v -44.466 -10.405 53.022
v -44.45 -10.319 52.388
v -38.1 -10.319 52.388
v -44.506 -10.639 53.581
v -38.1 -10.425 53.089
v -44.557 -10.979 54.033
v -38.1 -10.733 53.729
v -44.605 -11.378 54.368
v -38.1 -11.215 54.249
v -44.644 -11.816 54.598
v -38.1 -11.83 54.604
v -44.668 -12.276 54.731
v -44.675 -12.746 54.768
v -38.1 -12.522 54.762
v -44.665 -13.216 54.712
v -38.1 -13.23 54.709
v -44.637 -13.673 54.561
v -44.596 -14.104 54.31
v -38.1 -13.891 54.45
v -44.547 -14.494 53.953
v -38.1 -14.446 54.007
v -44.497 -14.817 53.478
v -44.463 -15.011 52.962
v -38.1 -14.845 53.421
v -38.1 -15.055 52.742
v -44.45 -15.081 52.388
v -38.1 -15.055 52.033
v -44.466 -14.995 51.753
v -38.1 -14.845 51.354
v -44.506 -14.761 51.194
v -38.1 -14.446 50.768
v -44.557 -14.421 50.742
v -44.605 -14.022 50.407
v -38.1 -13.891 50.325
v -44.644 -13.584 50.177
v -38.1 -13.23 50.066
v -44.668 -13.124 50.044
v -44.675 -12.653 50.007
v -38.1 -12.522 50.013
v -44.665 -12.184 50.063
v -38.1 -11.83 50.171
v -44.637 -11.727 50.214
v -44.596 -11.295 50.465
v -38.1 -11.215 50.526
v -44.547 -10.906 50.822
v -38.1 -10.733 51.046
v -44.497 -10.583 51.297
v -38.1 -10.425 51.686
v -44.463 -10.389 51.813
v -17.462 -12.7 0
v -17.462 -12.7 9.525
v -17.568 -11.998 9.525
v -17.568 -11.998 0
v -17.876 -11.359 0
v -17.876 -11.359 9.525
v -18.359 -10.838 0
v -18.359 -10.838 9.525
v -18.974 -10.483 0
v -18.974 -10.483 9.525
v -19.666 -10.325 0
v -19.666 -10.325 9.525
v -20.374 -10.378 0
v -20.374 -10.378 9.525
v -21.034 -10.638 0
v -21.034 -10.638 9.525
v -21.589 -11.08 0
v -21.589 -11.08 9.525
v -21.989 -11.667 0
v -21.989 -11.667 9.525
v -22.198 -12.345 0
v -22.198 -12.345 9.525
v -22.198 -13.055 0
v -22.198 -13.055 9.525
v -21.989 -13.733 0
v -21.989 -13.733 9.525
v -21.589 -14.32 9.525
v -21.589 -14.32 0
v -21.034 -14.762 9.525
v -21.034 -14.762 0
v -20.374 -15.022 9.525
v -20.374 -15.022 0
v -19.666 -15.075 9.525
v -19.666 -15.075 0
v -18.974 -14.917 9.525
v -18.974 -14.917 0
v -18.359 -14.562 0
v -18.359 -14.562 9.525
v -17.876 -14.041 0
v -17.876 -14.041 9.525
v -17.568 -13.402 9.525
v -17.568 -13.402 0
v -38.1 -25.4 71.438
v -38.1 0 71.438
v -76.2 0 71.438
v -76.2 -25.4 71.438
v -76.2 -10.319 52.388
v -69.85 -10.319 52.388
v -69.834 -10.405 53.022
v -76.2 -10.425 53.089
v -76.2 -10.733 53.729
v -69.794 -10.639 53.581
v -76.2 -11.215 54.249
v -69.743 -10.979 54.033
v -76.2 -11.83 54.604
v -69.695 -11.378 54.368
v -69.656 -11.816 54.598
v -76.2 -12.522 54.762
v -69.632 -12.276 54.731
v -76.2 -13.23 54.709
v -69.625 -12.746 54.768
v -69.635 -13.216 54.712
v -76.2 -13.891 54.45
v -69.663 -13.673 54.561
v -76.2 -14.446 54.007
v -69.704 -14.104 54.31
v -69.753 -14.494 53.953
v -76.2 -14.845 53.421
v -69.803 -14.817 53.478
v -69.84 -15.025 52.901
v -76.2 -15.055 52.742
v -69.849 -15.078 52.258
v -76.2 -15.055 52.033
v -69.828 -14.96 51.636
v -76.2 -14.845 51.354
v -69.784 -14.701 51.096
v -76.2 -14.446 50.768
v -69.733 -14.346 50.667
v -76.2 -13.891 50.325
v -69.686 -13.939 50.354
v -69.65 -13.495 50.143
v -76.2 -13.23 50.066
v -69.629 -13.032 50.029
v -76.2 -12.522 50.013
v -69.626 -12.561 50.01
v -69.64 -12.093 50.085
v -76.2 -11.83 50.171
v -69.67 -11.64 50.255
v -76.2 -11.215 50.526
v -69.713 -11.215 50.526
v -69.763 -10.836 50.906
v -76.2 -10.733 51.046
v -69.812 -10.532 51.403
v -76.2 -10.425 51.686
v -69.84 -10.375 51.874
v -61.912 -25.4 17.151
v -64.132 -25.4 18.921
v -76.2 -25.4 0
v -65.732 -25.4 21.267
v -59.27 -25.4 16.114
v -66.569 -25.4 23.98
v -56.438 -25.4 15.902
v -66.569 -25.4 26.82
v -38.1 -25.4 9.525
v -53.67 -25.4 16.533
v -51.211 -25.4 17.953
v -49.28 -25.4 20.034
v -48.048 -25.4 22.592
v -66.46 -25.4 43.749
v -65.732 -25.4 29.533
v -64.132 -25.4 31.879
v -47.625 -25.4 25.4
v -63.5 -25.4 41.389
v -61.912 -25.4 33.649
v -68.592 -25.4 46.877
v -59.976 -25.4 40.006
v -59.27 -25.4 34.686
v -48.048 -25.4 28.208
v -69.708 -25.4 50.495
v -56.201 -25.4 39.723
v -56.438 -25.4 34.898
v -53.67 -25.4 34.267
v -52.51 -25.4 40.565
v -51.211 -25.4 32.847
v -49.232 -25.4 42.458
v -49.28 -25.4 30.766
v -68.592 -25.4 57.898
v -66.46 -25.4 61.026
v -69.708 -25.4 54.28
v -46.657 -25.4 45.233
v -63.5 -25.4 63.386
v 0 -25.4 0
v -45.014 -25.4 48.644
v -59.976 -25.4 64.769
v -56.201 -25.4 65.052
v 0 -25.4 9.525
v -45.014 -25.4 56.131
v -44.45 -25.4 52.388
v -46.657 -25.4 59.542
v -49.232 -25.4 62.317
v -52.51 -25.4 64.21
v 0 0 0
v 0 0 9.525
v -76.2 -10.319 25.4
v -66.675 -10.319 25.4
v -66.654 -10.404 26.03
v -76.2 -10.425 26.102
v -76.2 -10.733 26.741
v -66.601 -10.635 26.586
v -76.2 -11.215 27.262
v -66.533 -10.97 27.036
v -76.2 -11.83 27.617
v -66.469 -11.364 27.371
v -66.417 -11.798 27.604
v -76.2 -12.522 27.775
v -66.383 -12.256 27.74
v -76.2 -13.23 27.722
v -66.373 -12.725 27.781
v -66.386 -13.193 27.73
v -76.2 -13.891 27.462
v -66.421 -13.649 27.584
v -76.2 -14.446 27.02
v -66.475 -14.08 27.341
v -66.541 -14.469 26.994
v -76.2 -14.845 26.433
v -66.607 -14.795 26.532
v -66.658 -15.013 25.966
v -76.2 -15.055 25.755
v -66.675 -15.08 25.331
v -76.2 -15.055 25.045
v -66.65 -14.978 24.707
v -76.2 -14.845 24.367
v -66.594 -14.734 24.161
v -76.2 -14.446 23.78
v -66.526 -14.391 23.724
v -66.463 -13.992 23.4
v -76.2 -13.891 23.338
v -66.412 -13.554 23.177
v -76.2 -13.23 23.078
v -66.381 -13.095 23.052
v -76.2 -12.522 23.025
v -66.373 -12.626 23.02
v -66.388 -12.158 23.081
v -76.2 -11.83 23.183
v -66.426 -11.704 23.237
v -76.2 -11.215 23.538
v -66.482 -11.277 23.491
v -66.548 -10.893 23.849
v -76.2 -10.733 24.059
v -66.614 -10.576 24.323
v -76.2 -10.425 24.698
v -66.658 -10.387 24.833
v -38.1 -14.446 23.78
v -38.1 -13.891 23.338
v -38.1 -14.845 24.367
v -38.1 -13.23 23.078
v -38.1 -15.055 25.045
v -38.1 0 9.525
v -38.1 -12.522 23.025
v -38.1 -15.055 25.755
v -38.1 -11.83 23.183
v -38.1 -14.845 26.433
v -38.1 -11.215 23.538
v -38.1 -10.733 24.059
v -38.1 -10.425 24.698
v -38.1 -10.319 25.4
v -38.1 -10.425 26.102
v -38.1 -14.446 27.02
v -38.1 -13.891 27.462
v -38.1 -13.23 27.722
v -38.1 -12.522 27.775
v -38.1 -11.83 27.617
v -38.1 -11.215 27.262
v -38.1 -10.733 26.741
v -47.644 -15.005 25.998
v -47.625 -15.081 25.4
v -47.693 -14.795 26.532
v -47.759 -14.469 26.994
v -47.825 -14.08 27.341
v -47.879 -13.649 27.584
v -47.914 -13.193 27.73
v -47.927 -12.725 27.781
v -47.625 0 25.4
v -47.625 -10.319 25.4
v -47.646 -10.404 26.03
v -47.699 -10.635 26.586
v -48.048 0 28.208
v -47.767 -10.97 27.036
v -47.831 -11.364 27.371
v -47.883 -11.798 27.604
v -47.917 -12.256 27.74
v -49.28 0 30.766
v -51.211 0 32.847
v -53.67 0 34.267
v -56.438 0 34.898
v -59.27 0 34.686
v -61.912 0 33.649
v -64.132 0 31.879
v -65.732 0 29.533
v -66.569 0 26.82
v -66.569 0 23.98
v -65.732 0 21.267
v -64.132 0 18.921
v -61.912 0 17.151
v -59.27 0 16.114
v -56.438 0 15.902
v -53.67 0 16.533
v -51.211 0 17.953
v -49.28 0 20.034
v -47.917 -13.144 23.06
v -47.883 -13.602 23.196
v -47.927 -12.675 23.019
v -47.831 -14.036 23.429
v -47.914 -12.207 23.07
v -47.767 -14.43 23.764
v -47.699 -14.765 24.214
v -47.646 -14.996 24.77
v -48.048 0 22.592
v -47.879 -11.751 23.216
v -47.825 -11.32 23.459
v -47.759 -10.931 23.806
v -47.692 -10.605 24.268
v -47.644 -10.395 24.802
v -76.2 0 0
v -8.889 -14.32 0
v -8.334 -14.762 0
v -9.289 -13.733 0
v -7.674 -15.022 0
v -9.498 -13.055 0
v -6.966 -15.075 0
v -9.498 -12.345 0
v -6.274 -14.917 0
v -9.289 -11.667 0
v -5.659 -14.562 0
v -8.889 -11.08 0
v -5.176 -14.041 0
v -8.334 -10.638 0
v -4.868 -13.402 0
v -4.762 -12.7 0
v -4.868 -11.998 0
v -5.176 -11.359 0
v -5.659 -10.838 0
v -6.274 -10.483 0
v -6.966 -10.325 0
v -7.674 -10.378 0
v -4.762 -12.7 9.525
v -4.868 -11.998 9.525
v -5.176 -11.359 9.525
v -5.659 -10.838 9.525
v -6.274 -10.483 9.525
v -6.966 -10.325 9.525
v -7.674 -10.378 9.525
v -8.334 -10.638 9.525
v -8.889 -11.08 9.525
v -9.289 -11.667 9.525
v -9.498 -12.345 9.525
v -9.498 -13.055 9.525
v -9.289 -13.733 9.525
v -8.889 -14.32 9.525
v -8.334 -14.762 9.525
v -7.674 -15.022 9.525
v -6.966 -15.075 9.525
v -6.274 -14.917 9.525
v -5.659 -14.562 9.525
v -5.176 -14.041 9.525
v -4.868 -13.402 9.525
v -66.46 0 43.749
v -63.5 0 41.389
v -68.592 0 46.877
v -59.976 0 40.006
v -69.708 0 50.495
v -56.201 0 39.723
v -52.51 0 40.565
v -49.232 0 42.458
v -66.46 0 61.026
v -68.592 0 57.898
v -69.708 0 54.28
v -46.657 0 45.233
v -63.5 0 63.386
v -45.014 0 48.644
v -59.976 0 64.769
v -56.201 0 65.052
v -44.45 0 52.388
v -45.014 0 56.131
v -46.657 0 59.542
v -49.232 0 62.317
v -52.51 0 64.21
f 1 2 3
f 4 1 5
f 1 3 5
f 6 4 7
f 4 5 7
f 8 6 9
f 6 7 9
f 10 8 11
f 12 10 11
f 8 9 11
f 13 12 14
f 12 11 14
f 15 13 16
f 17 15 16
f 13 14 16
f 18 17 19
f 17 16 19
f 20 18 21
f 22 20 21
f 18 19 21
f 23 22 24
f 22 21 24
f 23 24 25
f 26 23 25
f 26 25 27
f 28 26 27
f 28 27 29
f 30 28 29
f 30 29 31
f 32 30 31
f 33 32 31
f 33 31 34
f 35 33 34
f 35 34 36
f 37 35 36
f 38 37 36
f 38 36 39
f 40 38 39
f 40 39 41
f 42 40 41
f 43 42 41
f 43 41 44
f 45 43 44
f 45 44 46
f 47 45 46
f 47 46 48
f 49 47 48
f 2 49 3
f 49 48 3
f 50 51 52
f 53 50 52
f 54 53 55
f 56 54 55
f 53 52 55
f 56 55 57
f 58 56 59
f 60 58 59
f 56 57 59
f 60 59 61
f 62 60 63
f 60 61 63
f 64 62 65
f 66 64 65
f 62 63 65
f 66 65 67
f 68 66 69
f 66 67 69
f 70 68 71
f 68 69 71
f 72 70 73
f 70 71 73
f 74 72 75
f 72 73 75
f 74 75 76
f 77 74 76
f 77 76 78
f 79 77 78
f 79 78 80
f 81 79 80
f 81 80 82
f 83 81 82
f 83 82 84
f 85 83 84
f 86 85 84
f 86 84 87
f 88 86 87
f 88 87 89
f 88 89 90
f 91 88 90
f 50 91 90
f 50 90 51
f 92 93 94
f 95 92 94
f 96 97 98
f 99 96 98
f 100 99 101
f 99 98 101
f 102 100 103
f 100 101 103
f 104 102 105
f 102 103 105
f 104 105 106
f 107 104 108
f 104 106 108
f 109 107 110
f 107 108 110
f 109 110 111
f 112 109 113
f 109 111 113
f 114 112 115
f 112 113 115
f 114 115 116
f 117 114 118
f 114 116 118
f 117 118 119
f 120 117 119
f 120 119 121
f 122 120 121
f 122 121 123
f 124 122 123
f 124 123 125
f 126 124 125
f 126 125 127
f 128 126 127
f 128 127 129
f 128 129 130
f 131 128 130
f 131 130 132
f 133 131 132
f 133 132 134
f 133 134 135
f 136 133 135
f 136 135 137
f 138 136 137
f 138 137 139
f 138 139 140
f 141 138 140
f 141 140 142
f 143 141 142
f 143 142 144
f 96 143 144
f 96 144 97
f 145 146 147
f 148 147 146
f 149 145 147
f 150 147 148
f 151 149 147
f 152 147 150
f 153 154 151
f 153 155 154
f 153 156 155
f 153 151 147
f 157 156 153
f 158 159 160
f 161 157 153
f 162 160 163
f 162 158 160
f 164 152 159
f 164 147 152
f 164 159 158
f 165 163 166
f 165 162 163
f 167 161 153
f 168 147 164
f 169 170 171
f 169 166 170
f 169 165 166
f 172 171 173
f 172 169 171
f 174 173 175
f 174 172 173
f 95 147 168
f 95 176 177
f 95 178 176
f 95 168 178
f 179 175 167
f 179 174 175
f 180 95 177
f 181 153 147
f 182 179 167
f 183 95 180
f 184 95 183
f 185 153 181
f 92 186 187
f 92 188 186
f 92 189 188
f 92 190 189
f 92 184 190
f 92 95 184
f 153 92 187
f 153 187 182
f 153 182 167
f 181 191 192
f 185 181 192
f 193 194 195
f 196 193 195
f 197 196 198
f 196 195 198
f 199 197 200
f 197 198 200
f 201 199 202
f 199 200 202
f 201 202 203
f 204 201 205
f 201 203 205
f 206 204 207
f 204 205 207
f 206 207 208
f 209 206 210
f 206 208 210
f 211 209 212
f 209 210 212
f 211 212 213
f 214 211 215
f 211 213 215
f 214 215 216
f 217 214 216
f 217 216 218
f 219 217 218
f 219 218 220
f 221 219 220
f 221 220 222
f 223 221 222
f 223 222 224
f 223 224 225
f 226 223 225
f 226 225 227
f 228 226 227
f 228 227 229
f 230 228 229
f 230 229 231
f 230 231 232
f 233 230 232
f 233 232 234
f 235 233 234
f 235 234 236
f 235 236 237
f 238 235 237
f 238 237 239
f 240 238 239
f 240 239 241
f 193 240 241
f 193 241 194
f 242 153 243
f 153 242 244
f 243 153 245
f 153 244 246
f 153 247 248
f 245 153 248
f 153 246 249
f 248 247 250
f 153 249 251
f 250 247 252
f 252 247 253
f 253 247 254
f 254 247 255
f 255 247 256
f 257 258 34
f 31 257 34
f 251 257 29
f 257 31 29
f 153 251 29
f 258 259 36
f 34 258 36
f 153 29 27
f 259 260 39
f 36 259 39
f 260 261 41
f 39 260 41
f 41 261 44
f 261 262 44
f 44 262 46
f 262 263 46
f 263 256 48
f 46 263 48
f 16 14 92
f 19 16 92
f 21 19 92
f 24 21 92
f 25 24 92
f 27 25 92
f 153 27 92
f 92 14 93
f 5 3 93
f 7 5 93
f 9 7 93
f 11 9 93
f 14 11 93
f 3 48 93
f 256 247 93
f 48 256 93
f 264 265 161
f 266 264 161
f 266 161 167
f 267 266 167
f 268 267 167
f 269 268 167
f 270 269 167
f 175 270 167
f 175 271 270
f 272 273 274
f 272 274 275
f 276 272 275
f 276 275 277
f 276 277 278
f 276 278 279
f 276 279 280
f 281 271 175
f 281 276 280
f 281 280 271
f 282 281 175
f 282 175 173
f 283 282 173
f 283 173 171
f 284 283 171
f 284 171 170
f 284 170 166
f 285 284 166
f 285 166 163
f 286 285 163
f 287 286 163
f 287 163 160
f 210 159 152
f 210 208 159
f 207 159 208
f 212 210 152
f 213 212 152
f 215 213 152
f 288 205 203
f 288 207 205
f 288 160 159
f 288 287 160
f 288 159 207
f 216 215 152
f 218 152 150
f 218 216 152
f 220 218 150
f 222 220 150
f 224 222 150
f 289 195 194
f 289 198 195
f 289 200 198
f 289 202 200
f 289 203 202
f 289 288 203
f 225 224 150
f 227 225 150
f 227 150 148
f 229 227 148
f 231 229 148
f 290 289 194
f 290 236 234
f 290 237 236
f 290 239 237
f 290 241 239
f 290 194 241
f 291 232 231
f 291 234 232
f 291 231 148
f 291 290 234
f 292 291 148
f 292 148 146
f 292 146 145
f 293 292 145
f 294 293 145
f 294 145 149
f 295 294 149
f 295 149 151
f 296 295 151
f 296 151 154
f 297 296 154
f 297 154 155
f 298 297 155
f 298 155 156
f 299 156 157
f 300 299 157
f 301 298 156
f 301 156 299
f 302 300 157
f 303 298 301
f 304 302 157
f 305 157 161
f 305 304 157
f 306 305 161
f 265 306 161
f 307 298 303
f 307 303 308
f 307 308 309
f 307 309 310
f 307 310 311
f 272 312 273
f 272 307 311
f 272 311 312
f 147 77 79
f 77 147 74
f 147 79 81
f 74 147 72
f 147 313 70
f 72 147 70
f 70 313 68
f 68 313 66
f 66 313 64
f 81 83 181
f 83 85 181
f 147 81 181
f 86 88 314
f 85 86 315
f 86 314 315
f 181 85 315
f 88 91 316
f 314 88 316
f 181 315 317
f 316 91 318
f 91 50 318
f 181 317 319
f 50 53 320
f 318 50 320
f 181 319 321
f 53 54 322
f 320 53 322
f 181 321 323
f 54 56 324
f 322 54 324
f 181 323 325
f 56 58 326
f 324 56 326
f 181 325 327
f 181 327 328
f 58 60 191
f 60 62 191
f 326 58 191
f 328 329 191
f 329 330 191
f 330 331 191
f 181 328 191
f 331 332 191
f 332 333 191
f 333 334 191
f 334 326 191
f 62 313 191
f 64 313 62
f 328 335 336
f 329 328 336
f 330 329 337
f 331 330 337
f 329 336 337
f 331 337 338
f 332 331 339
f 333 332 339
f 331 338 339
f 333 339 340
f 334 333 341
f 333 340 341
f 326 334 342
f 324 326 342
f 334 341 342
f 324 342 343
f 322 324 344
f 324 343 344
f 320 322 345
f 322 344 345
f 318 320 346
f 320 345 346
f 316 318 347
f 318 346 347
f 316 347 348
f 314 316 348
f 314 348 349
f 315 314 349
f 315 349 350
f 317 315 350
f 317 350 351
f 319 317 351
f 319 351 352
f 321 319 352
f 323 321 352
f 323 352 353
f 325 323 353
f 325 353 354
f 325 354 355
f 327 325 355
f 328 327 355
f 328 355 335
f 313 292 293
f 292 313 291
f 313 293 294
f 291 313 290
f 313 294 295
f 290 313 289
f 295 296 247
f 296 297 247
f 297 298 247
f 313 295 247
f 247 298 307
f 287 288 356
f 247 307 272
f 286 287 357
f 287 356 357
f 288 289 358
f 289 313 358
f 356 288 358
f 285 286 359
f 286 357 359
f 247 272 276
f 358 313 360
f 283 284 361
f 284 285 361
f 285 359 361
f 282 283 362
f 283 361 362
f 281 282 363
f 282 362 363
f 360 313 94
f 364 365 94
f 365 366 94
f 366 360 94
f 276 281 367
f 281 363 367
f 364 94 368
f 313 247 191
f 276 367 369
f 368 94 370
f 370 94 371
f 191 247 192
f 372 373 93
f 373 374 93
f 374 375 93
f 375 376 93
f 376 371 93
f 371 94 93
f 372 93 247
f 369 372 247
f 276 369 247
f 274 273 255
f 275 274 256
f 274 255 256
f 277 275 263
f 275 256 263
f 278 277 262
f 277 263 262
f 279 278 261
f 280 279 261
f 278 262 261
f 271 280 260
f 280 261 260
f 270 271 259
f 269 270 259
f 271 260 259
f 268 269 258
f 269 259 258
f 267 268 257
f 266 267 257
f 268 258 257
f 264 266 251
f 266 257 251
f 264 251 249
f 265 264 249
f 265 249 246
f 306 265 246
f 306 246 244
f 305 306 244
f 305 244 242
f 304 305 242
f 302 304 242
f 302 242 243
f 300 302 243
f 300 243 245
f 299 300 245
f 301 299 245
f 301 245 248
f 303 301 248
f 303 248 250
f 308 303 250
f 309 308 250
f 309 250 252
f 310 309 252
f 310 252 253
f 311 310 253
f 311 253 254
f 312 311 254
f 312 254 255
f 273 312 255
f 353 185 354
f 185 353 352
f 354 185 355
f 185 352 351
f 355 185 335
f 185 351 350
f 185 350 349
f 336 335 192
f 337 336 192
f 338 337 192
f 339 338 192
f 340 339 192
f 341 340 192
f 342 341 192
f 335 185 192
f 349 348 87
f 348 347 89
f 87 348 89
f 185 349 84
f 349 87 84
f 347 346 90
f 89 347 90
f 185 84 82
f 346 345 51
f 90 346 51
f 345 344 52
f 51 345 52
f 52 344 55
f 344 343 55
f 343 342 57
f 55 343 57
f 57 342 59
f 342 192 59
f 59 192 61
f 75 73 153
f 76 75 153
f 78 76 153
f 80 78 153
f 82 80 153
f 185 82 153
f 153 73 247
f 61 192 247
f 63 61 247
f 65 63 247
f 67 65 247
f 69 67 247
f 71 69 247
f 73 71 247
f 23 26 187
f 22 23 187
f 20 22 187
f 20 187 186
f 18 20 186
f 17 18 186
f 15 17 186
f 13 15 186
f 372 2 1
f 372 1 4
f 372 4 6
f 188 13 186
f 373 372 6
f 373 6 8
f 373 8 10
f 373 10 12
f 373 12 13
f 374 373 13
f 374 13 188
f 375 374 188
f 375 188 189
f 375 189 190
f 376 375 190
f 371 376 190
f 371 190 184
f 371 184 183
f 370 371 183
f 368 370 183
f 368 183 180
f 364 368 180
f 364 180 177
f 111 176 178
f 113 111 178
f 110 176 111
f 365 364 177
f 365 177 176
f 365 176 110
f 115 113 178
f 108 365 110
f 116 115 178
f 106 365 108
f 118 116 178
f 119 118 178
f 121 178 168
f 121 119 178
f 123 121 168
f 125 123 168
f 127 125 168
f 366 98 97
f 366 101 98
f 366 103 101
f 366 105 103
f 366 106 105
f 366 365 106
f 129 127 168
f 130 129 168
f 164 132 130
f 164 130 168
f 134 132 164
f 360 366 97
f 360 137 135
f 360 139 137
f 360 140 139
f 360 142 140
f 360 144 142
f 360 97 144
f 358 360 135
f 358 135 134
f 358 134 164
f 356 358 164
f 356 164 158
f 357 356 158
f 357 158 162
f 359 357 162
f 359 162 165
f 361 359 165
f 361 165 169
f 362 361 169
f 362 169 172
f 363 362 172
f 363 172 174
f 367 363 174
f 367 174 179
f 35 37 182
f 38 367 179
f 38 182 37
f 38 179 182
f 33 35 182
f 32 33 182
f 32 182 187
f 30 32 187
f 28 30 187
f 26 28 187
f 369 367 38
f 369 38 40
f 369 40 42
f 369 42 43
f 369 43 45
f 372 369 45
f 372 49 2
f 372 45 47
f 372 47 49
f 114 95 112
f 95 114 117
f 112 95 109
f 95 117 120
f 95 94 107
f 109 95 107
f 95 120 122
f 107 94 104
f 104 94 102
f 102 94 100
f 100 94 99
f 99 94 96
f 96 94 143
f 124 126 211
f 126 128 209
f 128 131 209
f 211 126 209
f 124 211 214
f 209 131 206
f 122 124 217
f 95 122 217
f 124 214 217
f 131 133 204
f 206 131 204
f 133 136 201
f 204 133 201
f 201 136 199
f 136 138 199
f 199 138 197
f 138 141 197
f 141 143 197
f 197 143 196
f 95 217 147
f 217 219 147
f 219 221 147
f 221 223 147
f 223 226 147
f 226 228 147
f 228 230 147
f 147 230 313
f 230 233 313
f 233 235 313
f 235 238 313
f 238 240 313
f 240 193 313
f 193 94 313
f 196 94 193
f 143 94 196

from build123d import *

# Parameters (mm, degrees)
F0_R     = 9.525
F0_R_2   = 12.7
F1_DEPTH = 25.4
F2_R     = 2.38125
F3_DEPTH = 9.526
F4_R     = 2.38125
F5_DEPTH = 38.101


with BuildPart() as f1:
    # F0 (on Front) → F1 (new body)
    with BuildSketch(Plane.XZ):
        Polygon((-76.2, 0), (0, 0), (0, 9.525), (-38.1, 9.525), (-38.1, 71.4375), (-76.2, 71.4375), align=None)
        with Locations((-57.15, 25.4)):
            Circle(F0_R, mode=Mode.SUBTRACT)
        with Locations((-57.15, 52.3875)):
            Circle(F0_R_2, mode=Mode.SUBTRACT)
    extrude(amount=F1_DEPTH)

    # F2 (on face) → F3 (cut, through all)
    with BuildSketch(Plane.XY.offset(9.525)):
        with Locations((-7.14375, -12.7)):
            Circle(F2_R)
        with Locations((-19.84375, -12.7)):
            Circle(F2_R)
    extrude(amount=-F3_DEPTH, mode=Mode.SUBTRACT)

    # F4 (on face) → F5 (cut, through all)
    with BuildSketch(Plane.YZ.offset(-38.1)):
        with Locations((-12.7, 25.4)):
            Circle(F4_R)
        with Locations((-12.7, 52.3875)):
            Circle(F4_R)
    extrude(amount=-F5_DEPTH, mode=Mode.SUBTRACT)


solid = f1.part
